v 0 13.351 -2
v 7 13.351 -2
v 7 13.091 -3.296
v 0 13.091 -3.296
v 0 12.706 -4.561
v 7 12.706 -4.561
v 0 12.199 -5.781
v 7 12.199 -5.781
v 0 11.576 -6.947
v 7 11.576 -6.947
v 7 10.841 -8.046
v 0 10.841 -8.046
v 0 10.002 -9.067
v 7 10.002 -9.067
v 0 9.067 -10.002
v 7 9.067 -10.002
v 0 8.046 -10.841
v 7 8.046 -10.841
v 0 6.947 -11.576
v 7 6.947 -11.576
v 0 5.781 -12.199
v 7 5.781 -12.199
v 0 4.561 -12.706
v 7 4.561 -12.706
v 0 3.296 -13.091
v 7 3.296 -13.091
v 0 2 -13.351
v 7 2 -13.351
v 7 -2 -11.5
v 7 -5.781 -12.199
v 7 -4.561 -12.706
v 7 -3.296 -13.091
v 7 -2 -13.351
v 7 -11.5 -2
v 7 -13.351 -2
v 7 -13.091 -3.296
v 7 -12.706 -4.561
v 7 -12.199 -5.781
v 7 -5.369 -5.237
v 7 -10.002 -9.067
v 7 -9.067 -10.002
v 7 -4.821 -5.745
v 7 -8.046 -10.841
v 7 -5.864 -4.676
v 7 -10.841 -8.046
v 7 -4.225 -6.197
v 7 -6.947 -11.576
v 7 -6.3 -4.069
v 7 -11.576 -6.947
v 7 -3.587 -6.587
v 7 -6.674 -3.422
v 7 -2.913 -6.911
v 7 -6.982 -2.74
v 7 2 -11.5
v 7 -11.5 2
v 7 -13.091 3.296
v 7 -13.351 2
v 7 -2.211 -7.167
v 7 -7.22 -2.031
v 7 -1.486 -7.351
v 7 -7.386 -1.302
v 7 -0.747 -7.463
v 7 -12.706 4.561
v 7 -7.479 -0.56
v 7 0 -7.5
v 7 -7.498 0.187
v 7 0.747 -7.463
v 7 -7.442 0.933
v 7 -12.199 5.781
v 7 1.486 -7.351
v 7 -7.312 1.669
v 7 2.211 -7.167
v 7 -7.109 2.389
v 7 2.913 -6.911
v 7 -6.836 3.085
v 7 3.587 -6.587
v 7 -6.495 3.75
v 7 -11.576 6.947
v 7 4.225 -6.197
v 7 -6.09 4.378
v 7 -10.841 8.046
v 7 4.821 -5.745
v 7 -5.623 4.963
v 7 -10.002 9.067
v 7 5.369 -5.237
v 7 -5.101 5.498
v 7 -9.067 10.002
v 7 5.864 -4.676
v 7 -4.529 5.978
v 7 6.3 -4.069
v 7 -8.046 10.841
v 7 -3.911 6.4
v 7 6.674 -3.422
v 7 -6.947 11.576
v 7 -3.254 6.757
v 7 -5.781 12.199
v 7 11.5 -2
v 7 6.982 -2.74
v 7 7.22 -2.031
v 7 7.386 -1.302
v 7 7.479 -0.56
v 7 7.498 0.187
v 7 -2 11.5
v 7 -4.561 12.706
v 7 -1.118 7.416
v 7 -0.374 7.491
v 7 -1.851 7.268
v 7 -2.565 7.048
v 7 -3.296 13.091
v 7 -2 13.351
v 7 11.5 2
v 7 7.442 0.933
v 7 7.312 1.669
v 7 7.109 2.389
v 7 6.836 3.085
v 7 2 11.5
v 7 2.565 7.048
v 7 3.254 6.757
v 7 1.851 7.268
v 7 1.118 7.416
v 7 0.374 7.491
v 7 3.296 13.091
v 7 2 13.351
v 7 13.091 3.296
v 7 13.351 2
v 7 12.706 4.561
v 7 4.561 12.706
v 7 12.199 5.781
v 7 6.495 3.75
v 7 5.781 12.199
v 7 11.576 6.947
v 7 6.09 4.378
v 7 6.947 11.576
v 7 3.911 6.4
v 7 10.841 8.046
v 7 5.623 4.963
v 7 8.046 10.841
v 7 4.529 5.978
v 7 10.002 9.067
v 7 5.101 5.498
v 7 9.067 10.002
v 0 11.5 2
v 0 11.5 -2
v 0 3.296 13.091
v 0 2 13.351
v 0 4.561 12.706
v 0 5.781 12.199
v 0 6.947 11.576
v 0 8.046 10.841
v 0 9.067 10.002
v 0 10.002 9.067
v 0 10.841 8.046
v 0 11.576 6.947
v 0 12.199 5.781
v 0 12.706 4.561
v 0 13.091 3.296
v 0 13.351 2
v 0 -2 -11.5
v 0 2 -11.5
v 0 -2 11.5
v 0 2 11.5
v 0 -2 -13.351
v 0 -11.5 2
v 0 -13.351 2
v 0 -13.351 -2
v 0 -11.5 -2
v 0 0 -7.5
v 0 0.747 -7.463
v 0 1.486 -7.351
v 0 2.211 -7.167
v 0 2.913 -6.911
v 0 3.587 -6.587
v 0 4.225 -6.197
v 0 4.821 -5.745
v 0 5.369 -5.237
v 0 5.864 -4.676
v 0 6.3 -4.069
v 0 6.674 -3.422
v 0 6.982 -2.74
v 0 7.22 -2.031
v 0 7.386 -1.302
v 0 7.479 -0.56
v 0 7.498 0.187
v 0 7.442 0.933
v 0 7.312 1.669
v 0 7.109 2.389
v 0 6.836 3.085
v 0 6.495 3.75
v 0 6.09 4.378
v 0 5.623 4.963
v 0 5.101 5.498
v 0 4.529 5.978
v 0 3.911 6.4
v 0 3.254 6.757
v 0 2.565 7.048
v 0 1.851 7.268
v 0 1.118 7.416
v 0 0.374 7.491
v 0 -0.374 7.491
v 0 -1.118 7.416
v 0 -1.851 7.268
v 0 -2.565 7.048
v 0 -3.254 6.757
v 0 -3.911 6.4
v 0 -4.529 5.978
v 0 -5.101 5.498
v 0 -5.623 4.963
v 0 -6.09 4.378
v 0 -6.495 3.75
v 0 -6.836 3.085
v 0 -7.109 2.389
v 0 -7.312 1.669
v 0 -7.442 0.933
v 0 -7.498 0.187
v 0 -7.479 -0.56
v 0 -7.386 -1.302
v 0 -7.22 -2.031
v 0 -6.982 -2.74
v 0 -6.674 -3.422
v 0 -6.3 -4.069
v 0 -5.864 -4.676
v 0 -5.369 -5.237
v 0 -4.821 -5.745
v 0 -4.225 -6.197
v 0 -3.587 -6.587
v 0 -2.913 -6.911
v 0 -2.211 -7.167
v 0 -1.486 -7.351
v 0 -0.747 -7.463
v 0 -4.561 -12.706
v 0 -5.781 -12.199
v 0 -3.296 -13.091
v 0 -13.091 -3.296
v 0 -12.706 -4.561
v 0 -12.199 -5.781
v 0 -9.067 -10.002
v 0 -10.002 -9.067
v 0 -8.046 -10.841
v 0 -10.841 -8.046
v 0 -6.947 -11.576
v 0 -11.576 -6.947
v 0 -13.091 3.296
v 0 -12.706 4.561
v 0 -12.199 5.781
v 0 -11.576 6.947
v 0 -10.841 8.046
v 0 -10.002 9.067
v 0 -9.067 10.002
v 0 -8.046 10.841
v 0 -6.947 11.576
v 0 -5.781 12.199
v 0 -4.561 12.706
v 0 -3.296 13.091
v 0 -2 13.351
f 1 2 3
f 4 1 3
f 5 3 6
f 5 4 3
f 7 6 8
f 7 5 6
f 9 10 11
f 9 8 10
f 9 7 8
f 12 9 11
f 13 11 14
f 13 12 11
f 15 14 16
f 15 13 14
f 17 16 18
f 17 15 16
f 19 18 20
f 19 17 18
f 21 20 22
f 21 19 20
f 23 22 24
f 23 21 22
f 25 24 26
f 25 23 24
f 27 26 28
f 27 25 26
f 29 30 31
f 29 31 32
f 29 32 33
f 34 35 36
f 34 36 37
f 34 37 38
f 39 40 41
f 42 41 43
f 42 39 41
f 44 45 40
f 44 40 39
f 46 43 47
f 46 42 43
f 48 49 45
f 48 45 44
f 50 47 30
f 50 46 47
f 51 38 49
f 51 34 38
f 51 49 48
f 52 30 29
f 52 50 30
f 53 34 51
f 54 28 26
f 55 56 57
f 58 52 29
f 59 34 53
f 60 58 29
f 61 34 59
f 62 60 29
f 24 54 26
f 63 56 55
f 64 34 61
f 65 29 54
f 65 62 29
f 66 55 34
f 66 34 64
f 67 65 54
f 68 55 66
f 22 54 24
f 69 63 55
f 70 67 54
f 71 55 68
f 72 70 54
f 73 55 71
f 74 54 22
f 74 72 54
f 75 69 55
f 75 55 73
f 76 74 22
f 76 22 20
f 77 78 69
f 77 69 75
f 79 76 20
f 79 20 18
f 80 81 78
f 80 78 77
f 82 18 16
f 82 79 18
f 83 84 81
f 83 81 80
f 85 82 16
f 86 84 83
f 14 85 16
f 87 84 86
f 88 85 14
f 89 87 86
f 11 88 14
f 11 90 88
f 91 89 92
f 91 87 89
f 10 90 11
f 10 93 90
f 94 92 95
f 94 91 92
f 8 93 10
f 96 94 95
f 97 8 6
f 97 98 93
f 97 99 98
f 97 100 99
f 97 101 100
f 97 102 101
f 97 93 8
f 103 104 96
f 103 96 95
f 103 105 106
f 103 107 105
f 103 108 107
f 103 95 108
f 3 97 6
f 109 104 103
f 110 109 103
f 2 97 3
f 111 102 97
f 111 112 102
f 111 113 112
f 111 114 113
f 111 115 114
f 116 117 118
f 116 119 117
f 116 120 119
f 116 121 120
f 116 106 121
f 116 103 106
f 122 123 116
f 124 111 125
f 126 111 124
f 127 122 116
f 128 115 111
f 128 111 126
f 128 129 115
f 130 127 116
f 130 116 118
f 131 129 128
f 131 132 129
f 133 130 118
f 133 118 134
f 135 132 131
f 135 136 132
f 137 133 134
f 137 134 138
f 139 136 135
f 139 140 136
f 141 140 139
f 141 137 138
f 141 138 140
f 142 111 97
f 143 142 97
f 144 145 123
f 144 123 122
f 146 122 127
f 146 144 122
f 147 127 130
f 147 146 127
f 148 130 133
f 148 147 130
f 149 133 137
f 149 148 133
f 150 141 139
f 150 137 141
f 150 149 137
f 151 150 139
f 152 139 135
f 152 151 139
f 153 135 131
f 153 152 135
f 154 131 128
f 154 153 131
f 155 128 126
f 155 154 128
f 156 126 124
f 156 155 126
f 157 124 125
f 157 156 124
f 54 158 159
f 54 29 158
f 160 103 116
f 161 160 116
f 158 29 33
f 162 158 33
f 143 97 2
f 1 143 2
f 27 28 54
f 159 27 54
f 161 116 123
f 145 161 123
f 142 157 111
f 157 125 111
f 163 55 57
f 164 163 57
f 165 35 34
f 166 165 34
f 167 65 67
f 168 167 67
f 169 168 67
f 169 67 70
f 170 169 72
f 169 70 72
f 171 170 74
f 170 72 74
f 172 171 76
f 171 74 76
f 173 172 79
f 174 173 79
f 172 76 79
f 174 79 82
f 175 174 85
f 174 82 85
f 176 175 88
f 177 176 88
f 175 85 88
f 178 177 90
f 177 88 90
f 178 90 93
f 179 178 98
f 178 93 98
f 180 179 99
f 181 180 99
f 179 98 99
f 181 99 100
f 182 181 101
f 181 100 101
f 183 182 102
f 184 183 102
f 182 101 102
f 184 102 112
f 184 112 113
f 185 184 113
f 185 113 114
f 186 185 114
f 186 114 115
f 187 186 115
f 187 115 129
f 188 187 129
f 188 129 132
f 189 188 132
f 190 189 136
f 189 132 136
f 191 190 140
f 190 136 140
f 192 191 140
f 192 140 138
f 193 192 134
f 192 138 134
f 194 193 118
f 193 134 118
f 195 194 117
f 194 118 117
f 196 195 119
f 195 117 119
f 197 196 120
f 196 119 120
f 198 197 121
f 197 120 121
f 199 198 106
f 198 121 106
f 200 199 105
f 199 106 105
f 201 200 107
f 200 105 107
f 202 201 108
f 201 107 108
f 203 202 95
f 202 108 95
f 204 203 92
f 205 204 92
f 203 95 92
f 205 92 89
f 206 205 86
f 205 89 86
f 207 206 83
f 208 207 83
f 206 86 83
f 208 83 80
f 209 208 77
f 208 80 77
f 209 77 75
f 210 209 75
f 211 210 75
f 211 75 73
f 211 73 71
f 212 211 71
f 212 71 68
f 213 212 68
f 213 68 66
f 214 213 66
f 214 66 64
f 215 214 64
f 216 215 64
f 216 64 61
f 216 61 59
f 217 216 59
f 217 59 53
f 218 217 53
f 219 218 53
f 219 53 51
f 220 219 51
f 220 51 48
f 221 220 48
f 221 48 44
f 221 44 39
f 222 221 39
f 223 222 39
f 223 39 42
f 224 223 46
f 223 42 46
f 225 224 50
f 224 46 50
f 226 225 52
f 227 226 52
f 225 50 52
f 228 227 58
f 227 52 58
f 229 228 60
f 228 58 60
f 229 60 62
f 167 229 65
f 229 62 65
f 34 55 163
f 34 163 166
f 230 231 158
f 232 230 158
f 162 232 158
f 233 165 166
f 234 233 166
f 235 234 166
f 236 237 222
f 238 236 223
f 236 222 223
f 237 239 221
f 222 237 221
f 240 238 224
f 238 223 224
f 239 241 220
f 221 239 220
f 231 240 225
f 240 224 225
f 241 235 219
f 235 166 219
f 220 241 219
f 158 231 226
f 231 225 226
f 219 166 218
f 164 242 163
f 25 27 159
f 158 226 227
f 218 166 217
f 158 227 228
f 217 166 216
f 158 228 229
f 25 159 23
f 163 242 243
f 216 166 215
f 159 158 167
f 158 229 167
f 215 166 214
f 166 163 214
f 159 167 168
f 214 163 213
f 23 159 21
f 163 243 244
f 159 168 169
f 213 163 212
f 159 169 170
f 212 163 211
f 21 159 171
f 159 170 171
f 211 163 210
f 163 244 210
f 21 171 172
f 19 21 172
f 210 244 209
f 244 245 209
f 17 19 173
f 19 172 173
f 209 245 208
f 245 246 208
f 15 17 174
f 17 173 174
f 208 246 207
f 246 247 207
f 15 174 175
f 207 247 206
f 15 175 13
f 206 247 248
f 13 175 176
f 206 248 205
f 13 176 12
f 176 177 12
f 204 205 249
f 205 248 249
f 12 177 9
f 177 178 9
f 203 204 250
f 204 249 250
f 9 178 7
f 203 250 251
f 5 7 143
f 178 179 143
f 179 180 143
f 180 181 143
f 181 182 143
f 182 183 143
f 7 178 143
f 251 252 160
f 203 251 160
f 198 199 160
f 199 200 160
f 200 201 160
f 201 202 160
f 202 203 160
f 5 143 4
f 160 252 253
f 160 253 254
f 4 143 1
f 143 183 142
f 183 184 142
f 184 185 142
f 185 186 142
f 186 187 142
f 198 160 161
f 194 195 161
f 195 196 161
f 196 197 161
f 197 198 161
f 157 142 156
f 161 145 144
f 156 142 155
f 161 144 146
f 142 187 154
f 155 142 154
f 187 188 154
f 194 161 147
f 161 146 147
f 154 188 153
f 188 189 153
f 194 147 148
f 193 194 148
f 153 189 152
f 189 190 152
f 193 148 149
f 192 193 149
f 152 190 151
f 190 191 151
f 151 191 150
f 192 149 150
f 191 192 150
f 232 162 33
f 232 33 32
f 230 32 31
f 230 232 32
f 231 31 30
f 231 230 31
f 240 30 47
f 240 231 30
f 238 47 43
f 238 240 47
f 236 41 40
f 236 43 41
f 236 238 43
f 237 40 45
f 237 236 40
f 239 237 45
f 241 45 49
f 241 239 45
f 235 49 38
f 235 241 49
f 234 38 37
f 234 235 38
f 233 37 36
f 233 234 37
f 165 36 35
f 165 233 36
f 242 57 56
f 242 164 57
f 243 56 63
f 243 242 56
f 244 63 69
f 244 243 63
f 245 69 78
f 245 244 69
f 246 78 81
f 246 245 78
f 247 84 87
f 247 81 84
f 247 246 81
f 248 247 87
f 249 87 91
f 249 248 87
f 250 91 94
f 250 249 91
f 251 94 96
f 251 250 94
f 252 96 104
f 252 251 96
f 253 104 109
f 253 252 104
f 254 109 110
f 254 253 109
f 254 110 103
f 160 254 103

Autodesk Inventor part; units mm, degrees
ref_plane "YZ Plane" through (0, 0, 0) normal (1, 0, 0) x (0, 1, 0)
ref_plane "XZ Plane" through (0, 0, 0) normal (0, 1, 0) x (-1, 0, 0)
ref_plane "XY Plane" through (0, 0, 0) normal (0, 0, 1) x (1, 0, 0)
sketch "Sketch1" plane through (0, 0, 0) normal (1, 0, 0) x (0, 1, 0)
  circle A0 centre (0, 0) radius 13.5
  dimension "d0" = 27
extrude "Extrusion1" add sketch "Sketch1" along normal blind 7
sketch "Sketch2" plane through (7, 0, 0) normal (1, 0, 0) x (0, 0, -1)
  circle A0 centre (0, 0) radius 7.5
  dimension "d3" = 15
extrude "Extrusion2" cut sketch "Sketch2" against normal blind 7
thread "Thread1" size "M15x1.5" class "6H" standard "ISO Metric profile" length 13
sketch "Sketch3" plane through (7, 0, 0) normal (1, 0, 0) x (0, 0, -1)
  circle A0 centre (0, 0) radius 13.5 projected
  line L0 (0, 13.5) -> (0, 11.5)
  line L1 (0, 11.5) -> (-2, 11.5)
  line L2 (-2, 11.5) -> (2, 11.5)
  line L3 (2, 11.5) -> (2, 14.5713)
  line L4 (2, 14.5713) -> (-2, 14.5713)
  line L5 (-2, 14.5713) -> (-2, 11.5)
  line L6 (-13.5, 0) -> (-11.5, 0)
  line L7 (-11.5, 0) -> (-11.5, -2)
  line L8 (-11.5, -2) -> (-11.5, 2)
  line L9 (-11.5, 2) -> (-14.5713, 2)
  line L10 (-14.5713, 2) -> (-14.5713, -2)
  line L11 (-14.5713, -2) -> (-11.5, -2)
  line L12 (0, -13.5) -> (0, -11.5)
  line L13 (0, -11.5) -> (2, -11.5)
  line L14 (2, -11.5) -> (-2, -11.5)
  line L15 (-2, -11.5) -> (-2, -14.5713)
  line L16 (-2, -14.5713) -> (2, -14.5713)
  line L17 (2, -14.5713) -> (2, -11.5)
  line L18 (13.5, 0) -> (11.5, 0)
  line L19 (11.5, 0) -> (11.5, 2)
  line L20 (11.5, 2) -> (11.5, -2)
  line L21 (11.5, -2) -> (14.5713, -2)
  line L22 (14.5713, -2) -> (14.5713, 2)
  line L23 (14.5713, 2) -> (11.5, 2)
  dimension "d8" = 2
  dimension "d9" = 2
  dimension "d10" = 4
  dimension "d13" = 360
extrude "Extrusion3" cut sketch "Sketch3" against normal blind 7 contours L18 L19 L23 A0 | A0 L23 L22 L21 | A0 L21 L20 L18 | L3 L2 L0 A0 | A0 L5 L4 L3 | L17 L16 L15 A0 | A0 L12 L13 L17 | L0 L1 L5 A0 | A0 L15 L14 L12 | L9 L8 L6 A0 | A0 L11 L10 L9 | A0 L6 L7 L11
properties part number "8. LockNutM15" material "Polyethylene, High Density"
